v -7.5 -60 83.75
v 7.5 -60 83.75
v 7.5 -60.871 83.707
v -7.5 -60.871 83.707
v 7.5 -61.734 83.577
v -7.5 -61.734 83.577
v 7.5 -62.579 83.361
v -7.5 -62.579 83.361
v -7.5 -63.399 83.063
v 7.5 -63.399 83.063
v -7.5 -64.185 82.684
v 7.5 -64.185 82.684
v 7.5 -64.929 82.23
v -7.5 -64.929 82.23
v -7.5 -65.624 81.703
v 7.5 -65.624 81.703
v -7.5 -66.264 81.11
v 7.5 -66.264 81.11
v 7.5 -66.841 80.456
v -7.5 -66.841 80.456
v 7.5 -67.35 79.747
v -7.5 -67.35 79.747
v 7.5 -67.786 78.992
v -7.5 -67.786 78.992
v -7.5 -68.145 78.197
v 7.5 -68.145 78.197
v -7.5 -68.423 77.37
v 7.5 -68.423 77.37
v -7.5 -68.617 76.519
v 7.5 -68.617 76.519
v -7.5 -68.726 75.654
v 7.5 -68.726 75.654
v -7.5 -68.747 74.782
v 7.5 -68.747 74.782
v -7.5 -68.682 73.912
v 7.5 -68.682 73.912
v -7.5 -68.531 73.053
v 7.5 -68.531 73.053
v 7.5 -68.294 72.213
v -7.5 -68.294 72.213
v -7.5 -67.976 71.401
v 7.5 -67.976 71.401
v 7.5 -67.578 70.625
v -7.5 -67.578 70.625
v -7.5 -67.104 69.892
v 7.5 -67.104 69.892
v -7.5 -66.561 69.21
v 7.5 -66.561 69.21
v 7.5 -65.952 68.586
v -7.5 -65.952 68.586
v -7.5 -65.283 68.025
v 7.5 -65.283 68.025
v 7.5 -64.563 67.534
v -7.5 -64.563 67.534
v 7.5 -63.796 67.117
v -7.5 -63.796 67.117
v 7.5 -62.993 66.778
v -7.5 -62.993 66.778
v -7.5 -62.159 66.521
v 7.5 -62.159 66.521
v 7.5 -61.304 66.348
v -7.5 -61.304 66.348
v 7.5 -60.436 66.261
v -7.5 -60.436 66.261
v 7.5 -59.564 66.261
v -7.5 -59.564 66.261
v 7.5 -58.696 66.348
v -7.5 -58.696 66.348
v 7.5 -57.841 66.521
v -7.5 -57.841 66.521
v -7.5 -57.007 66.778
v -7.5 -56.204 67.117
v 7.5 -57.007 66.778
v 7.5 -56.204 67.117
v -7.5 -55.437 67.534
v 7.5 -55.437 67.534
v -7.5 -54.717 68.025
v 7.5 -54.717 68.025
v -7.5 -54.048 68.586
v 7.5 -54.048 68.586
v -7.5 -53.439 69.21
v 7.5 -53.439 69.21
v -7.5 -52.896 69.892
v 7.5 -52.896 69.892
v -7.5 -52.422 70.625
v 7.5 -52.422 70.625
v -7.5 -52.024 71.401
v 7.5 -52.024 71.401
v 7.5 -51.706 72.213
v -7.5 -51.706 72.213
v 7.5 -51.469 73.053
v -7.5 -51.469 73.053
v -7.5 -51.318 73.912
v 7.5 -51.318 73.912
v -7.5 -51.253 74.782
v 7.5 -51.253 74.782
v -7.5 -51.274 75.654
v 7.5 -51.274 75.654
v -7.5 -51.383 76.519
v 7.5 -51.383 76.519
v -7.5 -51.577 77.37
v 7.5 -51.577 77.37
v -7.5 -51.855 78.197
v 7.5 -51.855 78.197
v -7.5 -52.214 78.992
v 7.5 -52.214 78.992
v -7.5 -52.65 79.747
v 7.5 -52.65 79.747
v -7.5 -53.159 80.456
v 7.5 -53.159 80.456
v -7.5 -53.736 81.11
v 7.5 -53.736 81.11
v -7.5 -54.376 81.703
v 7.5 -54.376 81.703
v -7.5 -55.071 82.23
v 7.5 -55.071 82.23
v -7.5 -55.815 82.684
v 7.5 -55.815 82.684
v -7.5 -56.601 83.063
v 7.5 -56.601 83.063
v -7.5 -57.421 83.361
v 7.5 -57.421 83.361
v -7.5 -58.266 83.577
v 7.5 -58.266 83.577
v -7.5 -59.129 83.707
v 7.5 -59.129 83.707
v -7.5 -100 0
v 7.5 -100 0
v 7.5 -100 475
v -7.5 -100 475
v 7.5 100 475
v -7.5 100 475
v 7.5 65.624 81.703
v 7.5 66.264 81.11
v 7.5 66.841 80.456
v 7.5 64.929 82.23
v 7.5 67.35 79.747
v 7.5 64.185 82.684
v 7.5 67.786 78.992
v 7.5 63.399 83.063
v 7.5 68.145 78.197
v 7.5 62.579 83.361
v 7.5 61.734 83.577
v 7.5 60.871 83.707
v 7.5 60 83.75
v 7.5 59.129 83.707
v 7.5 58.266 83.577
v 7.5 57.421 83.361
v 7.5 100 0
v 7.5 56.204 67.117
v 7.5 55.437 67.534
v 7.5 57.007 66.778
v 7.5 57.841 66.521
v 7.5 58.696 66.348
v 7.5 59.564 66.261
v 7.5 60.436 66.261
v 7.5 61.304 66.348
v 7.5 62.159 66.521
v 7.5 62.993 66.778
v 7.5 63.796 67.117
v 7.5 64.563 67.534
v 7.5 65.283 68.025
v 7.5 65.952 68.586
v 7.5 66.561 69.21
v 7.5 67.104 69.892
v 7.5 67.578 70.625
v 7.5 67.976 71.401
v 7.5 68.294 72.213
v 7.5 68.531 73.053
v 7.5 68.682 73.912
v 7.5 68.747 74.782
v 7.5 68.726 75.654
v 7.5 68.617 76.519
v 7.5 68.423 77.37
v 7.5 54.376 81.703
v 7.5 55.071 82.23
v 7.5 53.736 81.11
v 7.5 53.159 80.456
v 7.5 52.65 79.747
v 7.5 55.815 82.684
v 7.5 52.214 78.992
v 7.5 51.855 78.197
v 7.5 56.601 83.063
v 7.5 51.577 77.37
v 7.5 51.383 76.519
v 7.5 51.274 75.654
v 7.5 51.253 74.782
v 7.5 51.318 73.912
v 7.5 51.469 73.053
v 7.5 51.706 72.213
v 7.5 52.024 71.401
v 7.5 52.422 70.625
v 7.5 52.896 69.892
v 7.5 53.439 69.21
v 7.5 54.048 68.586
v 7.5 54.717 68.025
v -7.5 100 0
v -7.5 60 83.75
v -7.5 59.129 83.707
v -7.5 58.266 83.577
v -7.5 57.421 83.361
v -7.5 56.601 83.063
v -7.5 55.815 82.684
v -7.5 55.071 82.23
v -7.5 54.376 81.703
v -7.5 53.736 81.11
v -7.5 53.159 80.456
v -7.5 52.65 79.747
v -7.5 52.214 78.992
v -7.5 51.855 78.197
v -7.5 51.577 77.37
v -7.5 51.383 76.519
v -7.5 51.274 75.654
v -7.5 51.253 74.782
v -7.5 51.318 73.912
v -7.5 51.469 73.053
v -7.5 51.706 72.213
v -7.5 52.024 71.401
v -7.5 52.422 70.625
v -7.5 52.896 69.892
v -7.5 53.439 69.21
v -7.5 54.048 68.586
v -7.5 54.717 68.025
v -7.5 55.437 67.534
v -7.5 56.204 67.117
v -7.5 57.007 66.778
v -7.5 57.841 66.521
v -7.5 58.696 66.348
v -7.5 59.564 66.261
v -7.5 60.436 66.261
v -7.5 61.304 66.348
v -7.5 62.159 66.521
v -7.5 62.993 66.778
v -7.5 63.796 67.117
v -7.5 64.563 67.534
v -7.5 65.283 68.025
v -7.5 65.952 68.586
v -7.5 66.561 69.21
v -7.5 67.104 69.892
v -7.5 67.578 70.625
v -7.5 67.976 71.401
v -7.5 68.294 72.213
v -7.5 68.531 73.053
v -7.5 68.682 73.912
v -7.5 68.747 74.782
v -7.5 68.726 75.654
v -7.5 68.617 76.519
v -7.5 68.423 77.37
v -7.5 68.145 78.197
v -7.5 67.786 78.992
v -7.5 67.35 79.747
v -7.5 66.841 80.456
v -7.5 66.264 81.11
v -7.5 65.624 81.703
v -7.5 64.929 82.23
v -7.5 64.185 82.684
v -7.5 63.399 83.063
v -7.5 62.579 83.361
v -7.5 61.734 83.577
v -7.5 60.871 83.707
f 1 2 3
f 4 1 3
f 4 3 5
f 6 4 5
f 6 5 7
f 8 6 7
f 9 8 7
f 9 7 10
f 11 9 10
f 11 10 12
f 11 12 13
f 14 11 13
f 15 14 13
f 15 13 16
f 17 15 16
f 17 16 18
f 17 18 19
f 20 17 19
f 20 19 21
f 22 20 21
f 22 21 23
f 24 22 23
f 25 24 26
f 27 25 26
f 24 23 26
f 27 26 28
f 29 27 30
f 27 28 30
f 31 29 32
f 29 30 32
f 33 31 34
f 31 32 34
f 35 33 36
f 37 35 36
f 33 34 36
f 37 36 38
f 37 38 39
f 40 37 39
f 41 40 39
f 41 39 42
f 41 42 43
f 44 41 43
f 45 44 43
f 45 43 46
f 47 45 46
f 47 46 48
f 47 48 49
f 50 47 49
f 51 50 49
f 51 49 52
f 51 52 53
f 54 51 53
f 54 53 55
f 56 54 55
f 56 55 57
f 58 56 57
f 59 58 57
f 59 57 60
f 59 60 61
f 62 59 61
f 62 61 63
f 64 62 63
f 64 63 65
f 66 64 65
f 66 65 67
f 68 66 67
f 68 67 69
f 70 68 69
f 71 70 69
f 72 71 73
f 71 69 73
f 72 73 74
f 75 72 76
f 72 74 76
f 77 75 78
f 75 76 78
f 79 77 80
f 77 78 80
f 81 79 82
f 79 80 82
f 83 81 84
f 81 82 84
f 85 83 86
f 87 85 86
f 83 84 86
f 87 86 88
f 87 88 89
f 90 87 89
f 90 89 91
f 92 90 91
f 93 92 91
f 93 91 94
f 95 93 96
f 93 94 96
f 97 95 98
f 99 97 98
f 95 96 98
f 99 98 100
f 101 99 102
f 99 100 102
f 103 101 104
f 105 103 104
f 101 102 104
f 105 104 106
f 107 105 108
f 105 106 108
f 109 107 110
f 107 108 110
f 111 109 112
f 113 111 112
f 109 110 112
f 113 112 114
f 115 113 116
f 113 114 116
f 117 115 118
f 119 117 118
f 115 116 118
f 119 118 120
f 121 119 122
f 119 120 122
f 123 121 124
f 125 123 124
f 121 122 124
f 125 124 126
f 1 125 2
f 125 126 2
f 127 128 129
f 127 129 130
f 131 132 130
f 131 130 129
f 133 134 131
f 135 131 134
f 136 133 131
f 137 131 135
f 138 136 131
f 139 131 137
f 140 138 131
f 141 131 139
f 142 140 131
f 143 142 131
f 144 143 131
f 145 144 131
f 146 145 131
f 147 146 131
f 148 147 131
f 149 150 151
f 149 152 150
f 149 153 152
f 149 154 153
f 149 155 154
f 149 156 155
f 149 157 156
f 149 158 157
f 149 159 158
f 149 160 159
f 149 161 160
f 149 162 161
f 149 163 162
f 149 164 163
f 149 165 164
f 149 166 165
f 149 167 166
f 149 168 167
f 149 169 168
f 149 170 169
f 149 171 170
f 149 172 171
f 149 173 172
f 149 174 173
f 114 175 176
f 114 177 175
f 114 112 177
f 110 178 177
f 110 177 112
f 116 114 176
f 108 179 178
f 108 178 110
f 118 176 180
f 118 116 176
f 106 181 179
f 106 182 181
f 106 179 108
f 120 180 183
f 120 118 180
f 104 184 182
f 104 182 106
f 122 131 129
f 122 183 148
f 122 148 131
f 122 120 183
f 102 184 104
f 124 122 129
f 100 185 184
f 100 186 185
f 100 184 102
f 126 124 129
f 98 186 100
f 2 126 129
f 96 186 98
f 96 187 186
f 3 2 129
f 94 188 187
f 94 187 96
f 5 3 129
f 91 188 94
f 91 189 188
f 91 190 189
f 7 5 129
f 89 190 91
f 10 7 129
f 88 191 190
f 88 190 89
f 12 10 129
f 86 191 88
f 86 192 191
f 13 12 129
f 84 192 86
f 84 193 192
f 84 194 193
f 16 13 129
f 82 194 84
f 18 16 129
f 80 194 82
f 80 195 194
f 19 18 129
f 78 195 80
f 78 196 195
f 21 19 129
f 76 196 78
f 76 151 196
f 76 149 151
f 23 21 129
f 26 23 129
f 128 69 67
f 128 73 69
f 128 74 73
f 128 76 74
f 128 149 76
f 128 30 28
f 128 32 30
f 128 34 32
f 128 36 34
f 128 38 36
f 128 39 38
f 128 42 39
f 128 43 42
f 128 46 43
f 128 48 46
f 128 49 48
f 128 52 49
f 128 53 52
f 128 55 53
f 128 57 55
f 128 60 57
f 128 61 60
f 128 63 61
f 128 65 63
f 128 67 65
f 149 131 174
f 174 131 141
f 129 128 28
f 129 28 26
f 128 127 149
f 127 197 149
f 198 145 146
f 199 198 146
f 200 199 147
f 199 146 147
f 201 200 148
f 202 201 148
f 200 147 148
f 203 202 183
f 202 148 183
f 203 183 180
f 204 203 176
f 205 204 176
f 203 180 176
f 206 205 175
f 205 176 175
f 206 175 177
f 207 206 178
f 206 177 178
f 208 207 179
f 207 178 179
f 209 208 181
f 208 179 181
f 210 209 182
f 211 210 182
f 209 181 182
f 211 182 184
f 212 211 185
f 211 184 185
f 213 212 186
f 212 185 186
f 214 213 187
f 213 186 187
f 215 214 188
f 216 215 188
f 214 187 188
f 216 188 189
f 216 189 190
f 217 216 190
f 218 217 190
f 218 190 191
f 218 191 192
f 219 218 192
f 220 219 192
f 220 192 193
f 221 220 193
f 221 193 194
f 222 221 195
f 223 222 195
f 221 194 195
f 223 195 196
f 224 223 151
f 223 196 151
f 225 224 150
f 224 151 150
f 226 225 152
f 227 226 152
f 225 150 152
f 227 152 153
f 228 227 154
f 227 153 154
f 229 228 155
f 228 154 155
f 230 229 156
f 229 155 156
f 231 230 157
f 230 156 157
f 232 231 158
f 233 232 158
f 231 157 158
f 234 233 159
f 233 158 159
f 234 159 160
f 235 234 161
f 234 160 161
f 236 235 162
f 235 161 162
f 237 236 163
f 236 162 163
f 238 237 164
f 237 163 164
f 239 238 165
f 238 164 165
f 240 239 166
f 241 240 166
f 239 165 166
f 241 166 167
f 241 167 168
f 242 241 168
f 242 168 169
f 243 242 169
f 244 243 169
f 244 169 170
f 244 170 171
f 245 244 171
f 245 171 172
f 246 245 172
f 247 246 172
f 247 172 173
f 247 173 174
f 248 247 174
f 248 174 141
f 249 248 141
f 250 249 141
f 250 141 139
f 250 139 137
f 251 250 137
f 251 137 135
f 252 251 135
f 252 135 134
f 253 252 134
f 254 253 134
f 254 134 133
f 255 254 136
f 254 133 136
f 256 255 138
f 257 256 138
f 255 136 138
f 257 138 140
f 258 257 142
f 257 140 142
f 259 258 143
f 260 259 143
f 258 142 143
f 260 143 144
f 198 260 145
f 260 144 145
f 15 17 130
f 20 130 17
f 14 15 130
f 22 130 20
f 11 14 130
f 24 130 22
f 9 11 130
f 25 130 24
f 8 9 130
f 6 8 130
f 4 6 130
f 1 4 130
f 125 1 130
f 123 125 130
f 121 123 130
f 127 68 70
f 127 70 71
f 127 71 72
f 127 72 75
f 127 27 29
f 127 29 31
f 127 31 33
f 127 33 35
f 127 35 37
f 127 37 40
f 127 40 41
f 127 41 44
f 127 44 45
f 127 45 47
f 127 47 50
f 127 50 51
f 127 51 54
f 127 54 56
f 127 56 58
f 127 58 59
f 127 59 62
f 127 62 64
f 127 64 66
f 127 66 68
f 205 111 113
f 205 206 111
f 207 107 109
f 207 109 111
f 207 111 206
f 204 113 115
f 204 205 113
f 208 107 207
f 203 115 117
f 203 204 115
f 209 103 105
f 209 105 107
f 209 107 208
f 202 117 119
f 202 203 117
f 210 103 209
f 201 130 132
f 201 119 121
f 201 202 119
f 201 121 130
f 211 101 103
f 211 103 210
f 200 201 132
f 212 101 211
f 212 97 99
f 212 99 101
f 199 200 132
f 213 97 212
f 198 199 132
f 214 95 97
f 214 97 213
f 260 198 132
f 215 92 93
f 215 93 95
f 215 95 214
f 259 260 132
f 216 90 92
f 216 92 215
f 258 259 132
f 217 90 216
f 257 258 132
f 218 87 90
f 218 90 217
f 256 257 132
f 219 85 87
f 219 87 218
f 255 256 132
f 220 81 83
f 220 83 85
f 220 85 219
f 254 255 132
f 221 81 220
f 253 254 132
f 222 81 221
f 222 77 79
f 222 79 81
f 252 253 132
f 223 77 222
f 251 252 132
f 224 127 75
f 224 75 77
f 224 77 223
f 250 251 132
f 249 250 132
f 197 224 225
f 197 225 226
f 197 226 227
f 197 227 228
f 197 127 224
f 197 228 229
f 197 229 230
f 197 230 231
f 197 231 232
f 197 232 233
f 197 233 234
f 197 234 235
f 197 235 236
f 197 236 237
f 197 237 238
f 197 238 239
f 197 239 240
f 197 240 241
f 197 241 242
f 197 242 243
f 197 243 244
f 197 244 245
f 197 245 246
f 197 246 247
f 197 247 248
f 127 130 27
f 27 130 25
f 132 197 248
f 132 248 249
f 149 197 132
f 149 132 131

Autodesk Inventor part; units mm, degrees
ref_plane "YZ Plane" through (0, 0, 0) normal (1, 0, 0) x (0, 1, 0)
ref_plane "Start Plane" through (0, 0, 0) normal (0, 0, 1) x (1, 0, 0)
ref_plane "End Plane" through (0, 0, 475) normal (0, 0, 1) x (1, 0, 0)
sketch "Sketch" plane through (0, 0, 0) normal (0, 0, 1) x (1, 0, 0)
  line L0 (7.5, -100) -> (-7.5, -100)
  line L1 (-7.5, -100) -> (-7.5, 100)
  line L2 (-7.5, 100) -> (7.5, 100)
  line L3 (7.5, 100) -> (7.5, -100)
  line L4 (-6, 0) -> (8, 0) construction
  line L5 (0, -30) -> (0, 40) construction
  line L6 (0, 140) -> (0, -140) construction
  line L7 (-11, 0) -> (13.5, 0) construction
  dimension "d0" = 200
  dimension "d1" = 15
  dimension "d4" = 7.5
  dimension "d5" = 100
extrude "Body" add sketch "Sketch" along normal up to surface (475 mm away) from surface at 0
sketch "Sketch3" plane through (0, 0, 0) normal (0, 0, 1) x (1, 0, 0)
  line L0 (0, 0) -> (10, 0)
ref_plane "Work Plane3" through (0, 0, 0) normal (0, -1, 0) x (1, 0, 0)
sketch "Sketch5" plane through (-7.5, 100, 0) normal (-1, 0, 0) x (0, 0, 1)
  point P0 (75, -40)
hole "Hole1" at (-7.5, 60, 75) direction (1, 0, 0) diameter 17.5 end through all
sketch "Sketch6" plane through (-7.5, 100, 0) normal (-1, 0, 0) x (0, 0, 1)
  point P0 (75, -160)
hole "Hole2" at (-7.5, -60, 75) direction (1, 0, 0) diameter 17.5 end through all
sketch "Sketch4" plane through (0, 0, 0) normal (0, -1, 0) x (1, 0, 0)
  line L0 (-2, 0) -> (12, 0) projected
  line L1 (-2, 475) -> (12, 475) projected
  dimension "d9" = 475
equation "\"d0\" = G_W"
equation "\"d1\" = G_H"
equation "\"d4\" = 0.5 * d1"
equation "\"d5\" = 0.5 * d0"
equation "\"d2\" = G_L"
equation "\"G_W\" = 200"
equation "\"G_H\" = 15"
equation "\"G_L\" = d9"
equation "\"G_OFFSET_START\" = 0"
equation "\"G_OFFSET_END\" = 0"
equation "\"d7\" = G_OFFSET_END + B_L"
equation "\"B_L\" = 475"
properties part number "DIN EN 10278 - 200 x 15 - 475" material "Steel, Mild"
